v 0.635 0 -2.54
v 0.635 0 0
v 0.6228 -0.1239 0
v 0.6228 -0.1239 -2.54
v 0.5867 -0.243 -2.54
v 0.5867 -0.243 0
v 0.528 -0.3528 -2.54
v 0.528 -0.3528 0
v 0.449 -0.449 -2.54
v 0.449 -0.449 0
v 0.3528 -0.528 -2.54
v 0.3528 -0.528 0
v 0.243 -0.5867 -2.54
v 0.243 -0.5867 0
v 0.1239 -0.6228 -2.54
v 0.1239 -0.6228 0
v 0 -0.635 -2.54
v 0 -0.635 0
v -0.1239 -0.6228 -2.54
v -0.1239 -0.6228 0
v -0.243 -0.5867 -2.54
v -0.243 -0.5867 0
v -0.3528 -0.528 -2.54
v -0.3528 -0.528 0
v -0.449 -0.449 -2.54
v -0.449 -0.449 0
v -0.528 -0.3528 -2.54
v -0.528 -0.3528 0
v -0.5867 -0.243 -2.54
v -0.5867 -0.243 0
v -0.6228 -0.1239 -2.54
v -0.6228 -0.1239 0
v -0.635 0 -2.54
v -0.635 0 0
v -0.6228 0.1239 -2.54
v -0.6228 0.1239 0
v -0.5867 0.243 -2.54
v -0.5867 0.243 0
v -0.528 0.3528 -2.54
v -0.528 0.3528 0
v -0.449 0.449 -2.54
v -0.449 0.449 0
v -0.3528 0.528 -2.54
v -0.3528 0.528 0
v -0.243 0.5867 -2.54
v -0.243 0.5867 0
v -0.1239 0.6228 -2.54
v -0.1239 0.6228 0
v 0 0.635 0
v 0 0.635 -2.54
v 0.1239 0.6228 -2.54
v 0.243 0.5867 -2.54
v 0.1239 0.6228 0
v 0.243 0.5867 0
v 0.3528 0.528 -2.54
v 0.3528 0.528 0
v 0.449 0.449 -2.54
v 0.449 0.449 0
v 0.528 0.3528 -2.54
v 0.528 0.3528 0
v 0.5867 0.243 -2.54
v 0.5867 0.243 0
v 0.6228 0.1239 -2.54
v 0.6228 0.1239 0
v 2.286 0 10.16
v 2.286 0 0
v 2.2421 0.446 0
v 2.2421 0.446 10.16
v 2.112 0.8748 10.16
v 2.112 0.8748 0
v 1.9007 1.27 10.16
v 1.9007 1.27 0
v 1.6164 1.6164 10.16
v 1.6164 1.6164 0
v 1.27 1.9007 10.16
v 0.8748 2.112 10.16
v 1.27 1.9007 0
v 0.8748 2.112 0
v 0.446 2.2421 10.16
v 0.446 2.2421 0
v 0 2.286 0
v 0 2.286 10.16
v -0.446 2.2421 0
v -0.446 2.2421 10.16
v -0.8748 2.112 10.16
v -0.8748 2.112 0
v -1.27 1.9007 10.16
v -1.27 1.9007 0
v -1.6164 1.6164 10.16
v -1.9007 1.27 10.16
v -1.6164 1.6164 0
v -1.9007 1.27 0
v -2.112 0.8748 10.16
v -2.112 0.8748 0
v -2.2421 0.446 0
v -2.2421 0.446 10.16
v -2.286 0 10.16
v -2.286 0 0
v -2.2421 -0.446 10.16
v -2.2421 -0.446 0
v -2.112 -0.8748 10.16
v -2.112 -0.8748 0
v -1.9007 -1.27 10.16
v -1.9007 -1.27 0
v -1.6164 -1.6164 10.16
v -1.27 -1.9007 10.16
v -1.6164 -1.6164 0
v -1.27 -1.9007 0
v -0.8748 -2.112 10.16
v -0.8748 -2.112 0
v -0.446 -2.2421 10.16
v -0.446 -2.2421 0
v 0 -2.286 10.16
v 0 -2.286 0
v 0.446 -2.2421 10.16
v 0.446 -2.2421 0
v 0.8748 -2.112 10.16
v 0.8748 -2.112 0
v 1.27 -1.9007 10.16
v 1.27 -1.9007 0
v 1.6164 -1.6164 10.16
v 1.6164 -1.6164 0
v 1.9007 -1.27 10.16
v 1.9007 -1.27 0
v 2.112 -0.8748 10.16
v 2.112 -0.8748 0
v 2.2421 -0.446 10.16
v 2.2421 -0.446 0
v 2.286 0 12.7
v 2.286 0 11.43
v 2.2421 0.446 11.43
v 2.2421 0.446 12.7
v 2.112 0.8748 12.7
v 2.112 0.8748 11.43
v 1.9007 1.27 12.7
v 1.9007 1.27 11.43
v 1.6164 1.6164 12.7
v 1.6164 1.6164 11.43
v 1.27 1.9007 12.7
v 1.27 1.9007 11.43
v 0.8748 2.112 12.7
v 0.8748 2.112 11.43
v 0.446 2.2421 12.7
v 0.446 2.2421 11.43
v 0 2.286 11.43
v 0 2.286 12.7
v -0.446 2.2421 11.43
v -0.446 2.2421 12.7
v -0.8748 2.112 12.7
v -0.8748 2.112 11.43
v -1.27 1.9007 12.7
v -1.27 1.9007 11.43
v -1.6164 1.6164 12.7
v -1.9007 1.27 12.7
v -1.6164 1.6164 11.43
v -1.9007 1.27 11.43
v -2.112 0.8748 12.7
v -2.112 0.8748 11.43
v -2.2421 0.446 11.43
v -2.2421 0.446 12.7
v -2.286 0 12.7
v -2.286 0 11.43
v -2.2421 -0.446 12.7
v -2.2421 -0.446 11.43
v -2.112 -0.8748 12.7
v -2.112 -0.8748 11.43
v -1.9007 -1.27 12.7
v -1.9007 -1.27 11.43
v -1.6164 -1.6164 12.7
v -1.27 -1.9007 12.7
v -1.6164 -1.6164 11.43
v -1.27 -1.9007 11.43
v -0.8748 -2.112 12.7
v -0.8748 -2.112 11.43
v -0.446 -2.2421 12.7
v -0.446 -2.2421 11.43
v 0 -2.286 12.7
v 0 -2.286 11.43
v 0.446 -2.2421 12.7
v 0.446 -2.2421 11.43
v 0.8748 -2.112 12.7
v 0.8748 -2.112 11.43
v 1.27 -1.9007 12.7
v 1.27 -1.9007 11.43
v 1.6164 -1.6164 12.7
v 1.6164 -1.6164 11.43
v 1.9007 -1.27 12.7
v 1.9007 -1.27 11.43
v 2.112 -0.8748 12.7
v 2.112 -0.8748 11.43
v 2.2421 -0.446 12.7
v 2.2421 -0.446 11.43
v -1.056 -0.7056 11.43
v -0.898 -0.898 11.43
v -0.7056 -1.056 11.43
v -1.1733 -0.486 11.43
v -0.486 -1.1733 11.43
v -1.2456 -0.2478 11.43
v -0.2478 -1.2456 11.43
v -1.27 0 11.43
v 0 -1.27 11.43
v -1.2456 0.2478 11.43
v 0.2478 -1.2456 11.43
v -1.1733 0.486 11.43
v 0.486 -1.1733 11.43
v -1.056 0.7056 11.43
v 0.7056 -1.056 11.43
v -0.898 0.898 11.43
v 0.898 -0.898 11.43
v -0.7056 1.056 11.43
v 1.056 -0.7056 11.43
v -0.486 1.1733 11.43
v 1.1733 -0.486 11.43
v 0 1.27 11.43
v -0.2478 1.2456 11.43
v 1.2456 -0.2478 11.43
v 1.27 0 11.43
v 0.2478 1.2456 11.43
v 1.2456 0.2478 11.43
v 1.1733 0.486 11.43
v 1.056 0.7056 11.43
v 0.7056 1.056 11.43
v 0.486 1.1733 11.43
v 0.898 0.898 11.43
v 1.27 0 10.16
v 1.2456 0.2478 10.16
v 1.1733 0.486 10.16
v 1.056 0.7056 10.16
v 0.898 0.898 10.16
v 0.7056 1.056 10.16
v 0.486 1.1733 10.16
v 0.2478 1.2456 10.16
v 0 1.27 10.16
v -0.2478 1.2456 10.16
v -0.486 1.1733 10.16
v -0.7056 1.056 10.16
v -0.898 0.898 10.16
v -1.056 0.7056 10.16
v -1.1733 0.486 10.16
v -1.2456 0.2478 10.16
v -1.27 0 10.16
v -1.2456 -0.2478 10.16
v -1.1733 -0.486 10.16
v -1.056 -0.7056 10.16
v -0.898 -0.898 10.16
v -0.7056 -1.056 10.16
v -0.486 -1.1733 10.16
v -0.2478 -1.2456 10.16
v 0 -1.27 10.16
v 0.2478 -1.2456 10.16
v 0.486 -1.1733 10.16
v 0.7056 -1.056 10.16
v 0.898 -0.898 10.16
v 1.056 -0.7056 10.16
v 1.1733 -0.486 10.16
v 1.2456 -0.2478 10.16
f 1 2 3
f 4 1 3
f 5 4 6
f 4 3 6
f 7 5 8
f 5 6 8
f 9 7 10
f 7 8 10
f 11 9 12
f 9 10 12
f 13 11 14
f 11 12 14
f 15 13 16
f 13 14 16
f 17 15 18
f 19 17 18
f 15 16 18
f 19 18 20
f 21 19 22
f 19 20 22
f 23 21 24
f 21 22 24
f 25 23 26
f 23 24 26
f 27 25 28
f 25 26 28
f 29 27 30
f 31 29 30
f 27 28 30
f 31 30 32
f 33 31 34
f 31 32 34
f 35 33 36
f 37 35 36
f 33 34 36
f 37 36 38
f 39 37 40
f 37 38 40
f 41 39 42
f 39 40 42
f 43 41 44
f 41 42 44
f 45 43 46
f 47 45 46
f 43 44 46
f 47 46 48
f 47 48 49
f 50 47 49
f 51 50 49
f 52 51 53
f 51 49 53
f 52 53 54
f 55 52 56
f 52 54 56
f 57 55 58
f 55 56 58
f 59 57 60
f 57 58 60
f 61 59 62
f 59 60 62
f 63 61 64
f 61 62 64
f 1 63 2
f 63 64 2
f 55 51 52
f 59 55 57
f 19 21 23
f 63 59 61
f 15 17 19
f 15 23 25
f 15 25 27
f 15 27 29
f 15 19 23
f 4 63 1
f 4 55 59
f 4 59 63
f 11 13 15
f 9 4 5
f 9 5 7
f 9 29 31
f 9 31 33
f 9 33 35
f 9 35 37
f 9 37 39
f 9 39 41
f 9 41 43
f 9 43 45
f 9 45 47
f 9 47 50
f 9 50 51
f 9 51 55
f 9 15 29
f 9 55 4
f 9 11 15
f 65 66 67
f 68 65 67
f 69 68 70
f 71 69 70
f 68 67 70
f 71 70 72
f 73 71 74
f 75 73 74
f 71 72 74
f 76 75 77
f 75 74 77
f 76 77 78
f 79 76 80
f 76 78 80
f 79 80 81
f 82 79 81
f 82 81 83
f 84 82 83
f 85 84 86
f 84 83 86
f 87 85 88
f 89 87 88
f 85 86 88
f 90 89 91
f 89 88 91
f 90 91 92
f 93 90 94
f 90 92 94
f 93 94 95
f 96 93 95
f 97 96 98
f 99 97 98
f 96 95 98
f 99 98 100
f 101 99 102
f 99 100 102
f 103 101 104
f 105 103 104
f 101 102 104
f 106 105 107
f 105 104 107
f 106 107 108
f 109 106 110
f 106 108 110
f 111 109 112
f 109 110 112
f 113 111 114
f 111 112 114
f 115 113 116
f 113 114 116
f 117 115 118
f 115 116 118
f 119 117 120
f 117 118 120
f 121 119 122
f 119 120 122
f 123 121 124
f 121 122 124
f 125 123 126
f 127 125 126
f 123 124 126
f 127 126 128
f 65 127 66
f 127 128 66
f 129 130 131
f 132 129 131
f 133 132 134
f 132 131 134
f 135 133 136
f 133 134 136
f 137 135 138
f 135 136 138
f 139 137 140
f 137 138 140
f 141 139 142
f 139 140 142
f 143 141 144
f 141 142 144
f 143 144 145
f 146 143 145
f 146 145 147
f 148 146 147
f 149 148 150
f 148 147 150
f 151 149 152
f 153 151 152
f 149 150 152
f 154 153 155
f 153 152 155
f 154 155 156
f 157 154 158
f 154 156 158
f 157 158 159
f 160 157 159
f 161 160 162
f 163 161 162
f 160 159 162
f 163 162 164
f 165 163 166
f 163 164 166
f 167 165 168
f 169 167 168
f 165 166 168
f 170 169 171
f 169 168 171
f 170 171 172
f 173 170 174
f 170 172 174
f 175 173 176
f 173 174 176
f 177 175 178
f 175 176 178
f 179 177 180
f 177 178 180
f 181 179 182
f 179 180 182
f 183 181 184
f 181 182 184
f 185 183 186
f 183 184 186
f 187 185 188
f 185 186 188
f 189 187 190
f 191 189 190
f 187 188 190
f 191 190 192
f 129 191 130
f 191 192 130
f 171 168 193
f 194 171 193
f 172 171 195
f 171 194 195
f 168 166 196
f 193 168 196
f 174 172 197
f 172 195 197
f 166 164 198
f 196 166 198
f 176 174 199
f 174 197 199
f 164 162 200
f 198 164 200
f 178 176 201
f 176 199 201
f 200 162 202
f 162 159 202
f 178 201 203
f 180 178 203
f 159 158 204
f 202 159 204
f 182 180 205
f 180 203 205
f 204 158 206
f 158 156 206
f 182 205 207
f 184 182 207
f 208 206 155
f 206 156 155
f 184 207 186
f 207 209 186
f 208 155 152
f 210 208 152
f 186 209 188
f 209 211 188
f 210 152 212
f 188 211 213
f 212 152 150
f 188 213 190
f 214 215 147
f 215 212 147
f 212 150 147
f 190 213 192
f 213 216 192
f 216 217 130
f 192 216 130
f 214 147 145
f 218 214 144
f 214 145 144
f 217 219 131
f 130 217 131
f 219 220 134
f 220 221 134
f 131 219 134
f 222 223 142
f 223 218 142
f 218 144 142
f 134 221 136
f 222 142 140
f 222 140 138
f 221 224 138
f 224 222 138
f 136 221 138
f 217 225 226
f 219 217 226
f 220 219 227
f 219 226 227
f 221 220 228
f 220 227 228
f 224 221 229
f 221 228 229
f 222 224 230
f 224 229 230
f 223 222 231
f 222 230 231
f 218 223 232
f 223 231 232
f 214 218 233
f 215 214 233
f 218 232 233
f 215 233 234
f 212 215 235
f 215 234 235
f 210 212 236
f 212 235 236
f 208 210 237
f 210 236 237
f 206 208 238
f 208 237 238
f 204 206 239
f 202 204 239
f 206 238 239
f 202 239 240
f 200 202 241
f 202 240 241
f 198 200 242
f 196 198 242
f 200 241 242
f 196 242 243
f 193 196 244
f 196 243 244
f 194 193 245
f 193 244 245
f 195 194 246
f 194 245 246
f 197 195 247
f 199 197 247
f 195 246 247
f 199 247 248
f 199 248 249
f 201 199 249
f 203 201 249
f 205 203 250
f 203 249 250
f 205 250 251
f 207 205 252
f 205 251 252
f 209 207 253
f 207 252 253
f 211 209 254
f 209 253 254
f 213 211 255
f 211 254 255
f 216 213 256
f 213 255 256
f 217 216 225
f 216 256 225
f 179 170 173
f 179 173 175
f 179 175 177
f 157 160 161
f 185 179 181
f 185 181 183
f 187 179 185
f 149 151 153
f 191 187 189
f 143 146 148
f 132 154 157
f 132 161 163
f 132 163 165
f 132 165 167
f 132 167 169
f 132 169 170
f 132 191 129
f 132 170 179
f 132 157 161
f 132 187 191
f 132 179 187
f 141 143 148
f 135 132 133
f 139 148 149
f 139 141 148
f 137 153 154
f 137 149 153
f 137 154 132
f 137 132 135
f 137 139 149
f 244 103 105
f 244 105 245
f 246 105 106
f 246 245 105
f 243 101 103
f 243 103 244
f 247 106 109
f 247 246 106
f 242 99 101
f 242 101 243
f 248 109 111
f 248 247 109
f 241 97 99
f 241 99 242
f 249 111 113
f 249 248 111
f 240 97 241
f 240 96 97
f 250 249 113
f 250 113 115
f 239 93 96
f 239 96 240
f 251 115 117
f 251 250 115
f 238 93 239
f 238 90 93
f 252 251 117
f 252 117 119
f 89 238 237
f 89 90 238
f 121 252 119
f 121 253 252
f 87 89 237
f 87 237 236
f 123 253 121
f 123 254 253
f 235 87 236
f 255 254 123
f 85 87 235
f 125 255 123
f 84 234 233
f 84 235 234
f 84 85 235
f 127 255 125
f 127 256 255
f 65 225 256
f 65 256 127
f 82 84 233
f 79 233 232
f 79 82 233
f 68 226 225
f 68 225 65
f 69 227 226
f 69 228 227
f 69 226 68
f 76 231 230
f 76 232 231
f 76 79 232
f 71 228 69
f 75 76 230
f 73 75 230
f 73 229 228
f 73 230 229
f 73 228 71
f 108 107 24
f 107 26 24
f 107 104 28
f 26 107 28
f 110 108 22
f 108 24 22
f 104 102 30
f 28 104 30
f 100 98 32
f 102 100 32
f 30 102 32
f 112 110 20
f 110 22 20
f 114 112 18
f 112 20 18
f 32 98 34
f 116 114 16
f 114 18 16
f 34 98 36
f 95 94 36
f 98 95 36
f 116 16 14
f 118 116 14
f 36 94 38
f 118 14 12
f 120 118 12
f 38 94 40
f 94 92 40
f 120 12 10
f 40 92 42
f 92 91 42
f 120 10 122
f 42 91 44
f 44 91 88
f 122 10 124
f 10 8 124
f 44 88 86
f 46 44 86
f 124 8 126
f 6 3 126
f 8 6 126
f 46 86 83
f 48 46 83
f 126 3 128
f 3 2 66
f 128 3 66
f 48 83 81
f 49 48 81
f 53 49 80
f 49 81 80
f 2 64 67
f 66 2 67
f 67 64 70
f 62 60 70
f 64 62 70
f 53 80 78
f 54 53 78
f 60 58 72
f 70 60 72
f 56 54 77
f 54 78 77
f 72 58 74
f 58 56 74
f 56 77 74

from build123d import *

# Parameters (mm, degrees)
F0_R     = 2.286
F1_DEPTH = 10.16
F2_R     = 1.27
F3_DEPTH = 1.27
F4_R     = 2.286
F5_DEPTH = 1.27
F6_R     = 0.635
F7_DEPTH = 2.54


with BuildPart() as f1:
    # F0 (on Top) → F1 (new body)
    with BuildSketch(Plane.XY):
        Circle(F0_R)
    extrude(amount=F1_DEPTH)

    # F2 (on face) → F3 (join)
    with BuildSketch(Plane.XY.offset(10.16)):
        Circle(F2_R)
    extrude(amount=F3_DEPTH)

    # F4 (on face) → F5 (join)
    with BuildSketch(Plane.XY.offset(11.43)):
        Circle(F4_R)
    extrude(amount=F5_DEPTH)

    # F6 (on face) → F7 (join)
    with BuildSketch(Plane(origin=(0, 0, 0), x_dir=(1, 0, 0), z_dir=(0, 0, -1))):
        Circle(F6_R)
    extrude(amount=F7_DEPTH)


solid = f1.part
